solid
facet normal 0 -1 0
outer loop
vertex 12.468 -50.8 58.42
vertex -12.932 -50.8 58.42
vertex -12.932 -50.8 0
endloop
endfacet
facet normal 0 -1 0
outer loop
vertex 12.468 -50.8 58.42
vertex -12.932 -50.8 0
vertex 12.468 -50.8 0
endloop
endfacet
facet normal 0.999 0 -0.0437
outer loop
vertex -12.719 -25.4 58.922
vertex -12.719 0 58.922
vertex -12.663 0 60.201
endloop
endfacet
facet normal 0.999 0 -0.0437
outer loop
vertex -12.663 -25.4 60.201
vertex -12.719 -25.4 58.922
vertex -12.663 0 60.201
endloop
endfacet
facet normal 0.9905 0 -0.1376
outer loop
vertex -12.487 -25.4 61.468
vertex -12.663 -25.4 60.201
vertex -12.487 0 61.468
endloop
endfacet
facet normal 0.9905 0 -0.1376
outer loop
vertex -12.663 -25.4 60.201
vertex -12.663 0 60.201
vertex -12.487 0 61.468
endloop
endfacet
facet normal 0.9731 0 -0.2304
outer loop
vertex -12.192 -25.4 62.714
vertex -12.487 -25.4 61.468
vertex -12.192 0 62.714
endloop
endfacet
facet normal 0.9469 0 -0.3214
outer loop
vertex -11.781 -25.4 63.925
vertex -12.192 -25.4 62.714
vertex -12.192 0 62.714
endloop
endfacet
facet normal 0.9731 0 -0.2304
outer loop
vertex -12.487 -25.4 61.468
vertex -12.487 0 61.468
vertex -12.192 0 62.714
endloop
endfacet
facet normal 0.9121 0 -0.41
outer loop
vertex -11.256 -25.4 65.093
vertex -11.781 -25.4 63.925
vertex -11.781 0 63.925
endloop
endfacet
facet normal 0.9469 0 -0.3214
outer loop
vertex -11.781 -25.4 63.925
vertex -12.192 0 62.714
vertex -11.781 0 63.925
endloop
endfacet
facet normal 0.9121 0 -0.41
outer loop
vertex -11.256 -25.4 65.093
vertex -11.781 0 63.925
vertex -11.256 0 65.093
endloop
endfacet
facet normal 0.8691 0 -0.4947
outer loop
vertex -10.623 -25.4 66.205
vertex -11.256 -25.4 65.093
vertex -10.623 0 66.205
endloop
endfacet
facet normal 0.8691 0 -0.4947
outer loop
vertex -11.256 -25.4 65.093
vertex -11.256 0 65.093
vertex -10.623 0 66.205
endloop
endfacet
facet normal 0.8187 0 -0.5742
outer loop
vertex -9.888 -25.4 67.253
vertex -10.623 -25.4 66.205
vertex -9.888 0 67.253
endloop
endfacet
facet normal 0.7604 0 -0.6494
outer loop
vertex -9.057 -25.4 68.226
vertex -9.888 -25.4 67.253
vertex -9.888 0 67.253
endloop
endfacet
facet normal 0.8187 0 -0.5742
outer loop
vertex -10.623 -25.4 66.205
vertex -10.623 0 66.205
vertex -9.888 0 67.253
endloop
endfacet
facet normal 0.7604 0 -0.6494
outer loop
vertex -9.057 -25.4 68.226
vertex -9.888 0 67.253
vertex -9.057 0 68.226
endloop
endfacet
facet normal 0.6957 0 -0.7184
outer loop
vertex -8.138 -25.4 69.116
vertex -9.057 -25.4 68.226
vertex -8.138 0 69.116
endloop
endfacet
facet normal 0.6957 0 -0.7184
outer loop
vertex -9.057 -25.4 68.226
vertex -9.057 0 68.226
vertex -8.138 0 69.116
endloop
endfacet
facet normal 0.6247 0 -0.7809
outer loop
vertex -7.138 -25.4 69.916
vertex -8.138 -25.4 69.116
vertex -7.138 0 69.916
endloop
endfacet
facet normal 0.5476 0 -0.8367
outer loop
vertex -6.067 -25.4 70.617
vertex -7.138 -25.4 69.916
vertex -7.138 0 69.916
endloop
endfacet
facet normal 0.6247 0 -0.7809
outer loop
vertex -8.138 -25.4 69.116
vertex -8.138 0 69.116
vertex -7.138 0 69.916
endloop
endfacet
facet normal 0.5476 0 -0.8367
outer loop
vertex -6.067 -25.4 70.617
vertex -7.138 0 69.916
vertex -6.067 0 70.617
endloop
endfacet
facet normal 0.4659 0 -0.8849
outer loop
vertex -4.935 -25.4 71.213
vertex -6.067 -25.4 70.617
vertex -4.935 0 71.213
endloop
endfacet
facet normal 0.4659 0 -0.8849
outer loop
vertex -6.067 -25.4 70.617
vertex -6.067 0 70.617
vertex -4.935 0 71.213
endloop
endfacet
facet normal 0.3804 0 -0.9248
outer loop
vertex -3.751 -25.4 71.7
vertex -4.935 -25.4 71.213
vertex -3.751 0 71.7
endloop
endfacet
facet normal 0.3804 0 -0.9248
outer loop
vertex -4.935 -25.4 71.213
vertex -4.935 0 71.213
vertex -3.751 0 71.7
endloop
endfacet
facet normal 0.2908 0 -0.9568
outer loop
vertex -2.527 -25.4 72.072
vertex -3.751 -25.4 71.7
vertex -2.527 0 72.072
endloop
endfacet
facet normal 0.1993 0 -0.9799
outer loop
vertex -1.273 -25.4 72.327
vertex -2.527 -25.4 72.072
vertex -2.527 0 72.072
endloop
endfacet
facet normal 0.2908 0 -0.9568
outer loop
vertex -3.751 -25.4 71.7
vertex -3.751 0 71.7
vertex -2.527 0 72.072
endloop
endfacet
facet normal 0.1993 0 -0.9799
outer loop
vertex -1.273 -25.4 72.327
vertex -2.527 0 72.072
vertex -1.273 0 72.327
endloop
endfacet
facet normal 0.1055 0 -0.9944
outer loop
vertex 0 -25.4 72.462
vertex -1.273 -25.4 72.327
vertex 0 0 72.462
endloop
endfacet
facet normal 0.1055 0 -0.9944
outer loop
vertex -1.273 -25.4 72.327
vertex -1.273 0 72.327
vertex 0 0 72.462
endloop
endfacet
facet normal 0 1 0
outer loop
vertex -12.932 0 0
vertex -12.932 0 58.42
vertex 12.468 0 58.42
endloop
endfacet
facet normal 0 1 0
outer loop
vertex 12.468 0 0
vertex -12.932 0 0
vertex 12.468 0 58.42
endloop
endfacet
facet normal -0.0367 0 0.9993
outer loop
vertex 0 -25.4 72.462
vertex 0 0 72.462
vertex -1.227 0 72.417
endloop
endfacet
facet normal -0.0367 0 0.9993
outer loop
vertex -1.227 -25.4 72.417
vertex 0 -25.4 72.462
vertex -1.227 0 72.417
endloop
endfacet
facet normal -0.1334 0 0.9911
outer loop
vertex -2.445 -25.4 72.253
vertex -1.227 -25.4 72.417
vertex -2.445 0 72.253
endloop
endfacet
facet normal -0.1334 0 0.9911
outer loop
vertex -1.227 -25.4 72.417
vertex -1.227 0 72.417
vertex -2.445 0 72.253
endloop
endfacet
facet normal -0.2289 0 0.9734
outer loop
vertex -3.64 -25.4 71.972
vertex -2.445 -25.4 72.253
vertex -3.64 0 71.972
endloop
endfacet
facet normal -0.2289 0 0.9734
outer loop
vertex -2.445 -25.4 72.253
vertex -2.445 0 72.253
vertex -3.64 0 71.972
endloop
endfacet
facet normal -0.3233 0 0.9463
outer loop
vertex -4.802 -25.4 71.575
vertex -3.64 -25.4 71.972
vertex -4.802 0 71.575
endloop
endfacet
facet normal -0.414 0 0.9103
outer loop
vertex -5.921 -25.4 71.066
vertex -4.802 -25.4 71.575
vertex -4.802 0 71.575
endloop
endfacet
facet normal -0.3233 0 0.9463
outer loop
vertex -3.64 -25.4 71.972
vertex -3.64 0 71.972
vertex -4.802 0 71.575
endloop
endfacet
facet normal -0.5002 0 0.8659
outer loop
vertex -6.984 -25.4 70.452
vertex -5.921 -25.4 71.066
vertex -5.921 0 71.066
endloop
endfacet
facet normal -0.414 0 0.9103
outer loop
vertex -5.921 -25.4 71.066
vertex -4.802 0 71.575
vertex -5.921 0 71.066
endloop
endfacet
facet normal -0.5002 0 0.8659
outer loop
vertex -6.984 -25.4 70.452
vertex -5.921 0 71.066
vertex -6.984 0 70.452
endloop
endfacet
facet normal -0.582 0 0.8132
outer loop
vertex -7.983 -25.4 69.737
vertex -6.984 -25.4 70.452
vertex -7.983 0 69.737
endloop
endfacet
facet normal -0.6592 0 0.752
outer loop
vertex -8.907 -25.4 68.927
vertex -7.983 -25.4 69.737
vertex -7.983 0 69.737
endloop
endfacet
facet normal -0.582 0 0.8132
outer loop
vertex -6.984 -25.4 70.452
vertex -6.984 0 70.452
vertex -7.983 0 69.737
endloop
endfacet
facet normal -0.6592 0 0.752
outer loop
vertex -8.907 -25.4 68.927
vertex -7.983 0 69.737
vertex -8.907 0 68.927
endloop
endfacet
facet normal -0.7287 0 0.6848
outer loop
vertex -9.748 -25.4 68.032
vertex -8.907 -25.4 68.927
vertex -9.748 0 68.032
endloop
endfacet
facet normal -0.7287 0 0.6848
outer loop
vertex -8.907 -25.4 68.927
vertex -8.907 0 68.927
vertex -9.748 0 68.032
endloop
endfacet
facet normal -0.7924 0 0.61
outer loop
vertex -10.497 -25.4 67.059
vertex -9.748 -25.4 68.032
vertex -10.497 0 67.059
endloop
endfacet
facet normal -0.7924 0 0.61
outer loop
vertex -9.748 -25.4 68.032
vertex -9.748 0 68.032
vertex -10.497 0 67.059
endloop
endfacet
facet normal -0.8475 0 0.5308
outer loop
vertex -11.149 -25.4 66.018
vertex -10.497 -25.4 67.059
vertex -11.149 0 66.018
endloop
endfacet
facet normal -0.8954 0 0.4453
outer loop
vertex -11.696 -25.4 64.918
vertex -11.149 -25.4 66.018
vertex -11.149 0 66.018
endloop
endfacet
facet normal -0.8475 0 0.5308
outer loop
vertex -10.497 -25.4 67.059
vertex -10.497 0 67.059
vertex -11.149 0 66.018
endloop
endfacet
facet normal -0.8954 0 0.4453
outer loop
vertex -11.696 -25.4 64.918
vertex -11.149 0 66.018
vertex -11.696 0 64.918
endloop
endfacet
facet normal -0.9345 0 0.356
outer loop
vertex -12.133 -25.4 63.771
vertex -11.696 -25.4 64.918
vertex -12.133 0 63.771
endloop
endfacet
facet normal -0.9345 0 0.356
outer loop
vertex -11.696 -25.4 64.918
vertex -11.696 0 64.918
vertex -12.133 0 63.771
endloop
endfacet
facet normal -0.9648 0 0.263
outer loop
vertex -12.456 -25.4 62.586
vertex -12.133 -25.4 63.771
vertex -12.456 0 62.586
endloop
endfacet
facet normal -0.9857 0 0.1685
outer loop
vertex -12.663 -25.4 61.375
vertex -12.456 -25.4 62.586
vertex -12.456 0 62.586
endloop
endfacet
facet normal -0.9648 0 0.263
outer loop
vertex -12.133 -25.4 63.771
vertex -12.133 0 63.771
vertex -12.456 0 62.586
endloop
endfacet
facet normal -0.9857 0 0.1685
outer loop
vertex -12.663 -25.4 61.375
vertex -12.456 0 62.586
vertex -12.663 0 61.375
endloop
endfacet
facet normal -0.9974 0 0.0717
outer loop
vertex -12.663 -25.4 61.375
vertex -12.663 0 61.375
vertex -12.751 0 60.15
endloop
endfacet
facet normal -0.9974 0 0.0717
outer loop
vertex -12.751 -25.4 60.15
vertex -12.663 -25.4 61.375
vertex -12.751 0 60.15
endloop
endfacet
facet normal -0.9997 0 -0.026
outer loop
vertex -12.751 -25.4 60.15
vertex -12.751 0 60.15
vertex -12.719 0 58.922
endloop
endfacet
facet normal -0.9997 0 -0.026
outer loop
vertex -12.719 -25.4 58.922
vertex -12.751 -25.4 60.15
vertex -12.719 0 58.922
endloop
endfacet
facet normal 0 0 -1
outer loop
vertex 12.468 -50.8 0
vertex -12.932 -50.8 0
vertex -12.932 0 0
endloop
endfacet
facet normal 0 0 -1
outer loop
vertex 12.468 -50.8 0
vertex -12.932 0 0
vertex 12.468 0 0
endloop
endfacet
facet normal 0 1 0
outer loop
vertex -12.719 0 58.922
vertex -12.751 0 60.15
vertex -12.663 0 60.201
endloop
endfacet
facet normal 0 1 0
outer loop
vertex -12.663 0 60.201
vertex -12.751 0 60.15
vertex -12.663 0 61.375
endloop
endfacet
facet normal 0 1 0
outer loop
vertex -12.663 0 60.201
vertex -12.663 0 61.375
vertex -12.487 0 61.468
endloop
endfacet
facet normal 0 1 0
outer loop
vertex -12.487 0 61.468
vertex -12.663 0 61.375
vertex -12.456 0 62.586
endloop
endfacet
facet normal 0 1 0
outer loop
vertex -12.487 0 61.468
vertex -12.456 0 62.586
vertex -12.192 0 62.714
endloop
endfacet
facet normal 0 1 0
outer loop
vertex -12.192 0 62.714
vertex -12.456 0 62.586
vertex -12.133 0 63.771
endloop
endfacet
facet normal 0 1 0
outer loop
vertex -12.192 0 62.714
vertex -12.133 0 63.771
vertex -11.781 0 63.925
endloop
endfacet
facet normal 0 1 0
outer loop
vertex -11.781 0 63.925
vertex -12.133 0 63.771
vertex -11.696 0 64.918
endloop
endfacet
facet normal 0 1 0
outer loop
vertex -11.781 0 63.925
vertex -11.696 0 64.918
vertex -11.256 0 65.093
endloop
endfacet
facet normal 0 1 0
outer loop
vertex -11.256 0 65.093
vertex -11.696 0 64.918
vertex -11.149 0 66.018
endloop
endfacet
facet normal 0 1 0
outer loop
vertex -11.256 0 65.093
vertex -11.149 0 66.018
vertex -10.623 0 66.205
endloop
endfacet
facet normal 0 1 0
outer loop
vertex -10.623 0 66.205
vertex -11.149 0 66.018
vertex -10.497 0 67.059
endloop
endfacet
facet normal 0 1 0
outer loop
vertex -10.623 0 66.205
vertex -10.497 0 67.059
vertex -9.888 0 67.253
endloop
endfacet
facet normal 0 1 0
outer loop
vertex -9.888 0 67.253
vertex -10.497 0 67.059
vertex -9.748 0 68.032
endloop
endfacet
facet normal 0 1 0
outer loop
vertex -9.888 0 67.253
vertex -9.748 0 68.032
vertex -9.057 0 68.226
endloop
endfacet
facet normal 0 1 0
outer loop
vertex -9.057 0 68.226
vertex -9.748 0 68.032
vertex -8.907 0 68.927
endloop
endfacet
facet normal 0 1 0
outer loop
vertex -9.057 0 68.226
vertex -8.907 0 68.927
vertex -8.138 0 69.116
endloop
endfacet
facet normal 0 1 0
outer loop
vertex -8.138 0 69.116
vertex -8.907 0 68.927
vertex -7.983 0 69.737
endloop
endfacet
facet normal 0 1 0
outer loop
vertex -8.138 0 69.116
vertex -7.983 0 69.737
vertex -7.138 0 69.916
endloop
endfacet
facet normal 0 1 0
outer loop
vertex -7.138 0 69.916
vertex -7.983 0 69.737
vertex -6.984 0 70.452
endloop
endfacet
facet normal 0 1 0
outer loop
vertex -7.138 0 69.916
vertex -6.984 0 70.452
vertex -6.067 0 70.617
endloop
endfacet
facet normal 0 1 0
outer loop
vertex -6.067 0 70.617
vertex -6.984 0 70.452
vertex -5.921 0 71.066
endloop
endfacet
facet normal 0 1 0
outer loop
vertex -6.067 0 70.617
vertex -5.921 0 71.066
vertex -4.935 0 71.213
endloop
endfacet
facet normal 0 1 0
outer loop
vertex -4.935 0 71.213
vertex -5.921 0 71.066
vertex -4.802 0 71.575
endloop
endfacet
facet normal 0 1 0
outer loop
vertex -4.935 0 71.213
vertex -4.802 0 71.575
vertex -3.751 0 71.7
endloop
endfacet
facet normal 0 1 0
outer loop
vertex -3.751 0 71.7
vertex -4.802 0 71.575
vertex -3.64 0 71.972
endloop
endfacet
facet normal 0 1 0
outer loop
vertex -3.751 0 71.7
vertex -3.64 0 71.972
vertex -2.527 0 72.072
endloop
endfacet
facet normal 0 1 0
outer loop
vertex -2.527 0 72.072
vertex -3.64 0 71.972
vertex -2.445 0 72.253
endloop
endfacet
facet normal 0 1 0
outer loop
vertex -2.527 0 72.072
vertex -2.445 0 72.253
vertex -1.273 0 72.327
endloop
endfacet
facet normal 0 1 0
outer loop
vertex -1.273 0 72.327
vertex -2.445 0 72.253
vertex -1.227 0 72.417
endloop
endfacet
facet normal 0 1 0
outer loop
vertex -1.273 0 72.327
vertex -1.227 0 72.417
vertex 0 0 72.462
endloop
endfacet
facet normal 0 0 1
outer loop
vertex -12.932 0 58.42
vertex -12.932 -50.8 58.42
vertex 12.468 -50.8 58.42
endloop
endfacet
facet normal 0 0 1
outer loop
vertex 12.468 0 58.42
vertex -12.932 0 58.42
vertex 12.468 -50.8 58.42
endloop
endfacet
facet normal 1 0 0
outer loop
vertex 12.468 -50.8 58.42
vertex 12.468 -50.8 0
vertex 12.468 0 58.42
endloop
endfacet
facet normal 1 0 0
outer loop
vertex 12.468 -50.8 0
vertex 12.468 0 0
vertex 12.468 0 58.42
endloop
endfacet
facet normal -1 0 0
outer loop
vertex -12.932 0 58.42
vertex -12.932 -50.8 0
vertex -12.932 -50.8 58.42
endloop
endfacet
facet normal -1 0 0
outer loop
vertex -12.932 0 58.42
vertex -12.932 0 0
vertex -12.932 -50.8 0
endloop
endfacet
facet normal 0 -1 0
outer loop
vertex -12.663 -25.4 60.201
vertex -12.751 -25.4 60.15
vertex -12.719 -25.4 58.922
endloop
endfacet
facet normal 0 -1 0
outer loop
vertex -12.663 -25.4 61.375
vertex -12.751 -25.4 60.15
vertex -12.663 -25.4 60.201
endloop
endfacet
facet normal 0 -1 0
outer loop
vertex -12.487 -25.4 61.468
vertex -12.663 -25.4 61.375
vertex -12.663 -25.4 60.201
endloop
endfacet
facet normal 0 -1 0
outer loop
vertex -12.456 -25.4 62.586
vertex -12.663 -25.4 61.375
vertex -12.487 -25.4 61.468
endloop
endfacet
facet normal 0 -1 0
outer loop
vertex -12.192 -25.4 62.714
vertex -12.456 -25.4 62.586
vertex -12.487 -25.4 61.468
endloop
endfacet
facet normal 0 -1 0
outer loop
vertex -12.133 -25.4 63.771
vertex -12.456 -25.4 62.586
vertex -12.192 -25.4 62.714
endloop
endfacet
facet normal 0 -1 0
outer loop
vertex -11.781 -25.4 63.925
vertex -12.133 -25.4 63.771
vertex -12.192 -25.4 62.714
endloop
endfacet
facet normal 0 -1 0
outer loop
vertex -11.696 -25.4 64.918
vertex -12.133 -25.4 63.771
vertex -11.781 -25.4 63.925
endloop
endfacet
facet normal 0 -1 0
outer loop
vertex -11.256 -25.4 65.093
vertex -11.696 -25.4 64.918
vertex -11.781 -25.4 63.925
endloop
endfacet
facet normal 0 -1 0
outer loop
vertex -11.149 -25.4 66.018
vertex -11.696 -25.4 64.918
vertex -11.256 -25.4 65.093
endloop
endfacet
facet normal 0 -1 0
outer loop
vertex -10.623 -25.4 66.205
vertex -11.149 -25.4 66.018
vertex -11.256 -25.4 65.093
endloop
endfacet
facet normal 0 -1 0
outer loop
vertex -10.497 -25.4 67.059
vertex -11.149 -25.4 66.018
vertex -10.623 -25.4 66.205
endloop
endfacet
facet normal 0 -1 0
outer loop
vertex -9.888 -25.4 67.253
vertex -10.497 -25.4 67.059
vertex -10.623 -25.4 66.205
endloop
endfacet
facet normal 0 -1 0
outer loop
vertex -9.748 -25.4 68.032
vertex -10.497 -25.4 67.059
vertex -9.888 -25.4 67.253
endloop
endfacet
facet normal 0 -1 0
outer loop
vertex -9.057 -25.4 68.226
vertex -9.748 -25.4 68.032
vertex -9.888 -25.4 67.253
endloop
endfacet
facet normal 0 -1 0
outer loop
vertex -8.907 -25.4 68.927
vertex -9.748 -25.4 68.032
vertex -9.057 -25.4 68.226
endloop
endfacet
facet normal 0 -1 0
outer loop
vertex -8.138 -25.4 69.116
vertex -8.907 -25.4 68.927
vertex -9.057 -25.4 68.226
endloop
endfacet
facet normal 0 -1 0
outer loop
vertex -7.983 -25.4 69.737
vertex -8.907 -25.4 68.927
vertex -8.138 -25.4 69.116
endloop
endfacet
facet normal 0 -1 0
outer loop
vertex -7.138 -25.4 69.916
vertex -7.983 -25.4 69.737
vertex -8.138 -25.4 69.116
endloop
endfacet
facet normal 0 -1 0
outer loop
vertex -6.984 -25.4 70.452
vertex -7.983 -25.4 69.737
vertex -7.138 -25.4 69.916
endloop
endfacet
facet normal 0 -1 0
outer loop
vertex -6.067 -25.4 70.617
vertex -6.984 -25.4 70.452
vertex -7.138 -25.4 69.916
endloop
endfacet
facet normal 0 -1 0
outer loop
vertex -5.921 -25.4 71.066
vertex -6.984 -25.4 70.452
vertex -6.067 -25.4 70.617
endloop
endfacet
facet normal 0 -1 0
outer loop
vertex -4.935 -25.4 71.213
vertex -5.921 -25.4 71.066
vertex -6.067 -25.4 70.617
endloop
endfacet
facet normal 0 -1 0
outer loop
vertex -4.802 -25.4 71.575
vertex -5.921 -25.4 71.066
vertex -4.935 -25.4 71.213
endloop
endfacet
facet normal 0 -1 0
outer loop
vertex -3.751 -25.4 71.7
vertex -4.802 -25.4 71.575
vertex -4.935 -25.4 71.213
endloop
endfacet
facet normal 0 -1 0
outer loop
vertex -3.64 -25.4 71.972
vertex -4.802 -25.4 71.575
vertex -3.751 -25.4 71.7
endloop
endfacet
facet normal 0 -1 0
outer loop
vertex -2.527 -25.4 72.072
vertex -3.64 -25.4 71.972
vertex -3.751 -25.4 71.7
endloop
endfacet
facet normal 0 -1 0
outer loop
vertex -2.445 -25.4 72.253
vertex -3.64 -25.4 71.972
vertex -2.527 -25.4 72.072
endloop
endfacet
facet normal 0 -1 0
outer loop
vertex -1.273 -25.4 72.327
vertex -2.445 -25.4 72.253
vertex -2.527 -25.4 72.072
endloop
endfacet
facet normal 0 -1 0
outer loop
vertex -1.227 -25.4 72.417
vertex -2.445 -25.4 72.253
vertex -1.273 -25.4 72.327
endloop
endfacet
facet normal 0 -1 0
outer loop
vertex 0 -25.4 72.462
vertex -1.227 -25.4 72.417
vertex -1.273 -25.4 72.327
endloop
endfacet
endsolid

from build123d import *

# Parameters (mm, degrees)
F0_W      = 25.4
F0_H      = 58.42
F1_DEPTH  = 25.4
F1_FACE_W = 25.4
F1_FACE_H = 58.42
F3_DEPTH  = 25.4


with BuildPart() as f1:
    # F0 (on Front) → F1 (new body)
    with BuildSketch(Plane.XZ):
        with Locations((-0.232415, 29.21)):
            Rectangle(F0_W, F0_H)
    extrude(amount=F1_DEPTH)

    # F2 (on Front) + F1_face (on face) → F3 (join)
    with BuildSketch(Plane.XZ):
        with BuildLine():
            ThreePointArc((-12.718554, 58.922013), (-9.057083, 68.226195), (0, 72.462164))
            ThreePointArc((0, 72.462164), (-9.337989, 68.490057), (-12.718554, 58.922013))
        make_face()
    with BuildSketch(Plane(origin=(-0.232415, -25.4, 29.21), x_dir=(1, 0, 0), z_dir=(0, -1, 0))):
        Rectangle(F1_FACE_W, F1_FACE_H)
    extrude(amount=F3_DEPTH)


solid = f1.part
